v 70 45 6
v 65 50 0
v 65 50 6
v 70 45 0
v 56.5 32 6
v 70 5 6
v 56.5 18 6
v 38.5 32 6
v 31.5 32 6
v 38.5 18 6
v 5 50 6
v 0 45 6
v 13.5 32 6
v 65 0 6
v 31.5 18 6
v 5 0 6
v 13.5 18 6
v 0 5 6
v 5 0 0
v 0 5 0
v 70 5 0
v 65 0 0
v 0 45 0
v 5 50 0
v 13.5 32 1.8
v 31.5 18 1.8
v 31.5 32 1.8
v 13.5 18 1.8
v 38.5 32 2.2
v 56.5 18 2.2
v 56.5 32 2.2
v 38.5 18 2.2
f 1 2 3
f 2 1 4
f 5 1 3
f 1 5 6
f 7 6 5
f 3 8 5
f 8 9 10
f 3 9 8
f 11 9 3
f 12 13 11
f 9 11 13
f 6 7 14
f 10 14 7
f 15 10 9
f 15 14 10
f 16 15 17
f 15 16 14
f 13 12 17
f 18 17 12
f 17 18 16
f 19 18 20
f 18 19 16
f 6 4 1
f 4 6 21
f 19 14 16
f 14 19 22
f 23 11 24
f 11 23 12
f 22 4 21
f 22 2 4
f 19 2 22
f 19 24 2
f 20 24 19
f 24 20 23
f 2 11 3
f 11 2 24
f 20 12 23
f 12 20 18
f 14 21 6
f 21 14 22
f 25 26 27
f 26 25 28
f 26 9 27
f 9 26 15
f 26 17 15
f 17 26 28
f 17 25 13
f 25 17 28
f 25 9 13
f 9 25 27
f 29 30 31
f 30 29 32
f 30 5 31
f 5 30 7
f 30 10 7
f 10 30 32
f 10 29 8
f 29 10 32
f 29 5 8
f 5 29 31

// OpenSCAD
$fn = 32;

// ----------------------------------------------------------------------
// Windowed plate: 2 voids, 70 x 50 x 6 mm
// ----------------------------------------------------------------------

// --- parameters (mm) ---
plate_l = 70;             // plate length, X
plate_w = 50;             // plate width, Y
plate_t = 6;              // plate thickness, Z
edge_margin = 10;         // wall from the plate edge to any window
windows = 2;              // number of windows in the row
win_l = 18;               // window length
win_w = 14;               // window width
win_pitch = 25;           // window pitch along X
depth_1 = 4.2;            // depth of void 1 (full thickness = through)
depth_2 = 3.8;            // depth of void 2 (full thickness = through)
corner_c = 5;             // corner chamfer of the plate

profile = [[5, 0], [65, 0], [70, 5], [70, 45], [65, 50], [5, 50], [0, 45], [0, 5]];  // primary outline, 8 points, counter clockwise
void_1 = [[13.5, 18], [31.5, 18], [31.5, 32], [13.5, 32]];  // window 1 of the row, 4 points
void_2 = [[38.5, 18], [56.5, 18], [56.5, 32], [38.5, 32]];  // window 2 of the row, 4 points

// --- the one profile operation ---
difference() {
  linear_extrude(height = plate_t) polygon(points = profile);
  translate([0, 0, plate_t - depth_1])
    linear_extrude(height = depth_1 + 1) polygon(points = void_1);
  translate([0, 0, plate_t - depth_2])
    linear_extrude(height = depth_2 + 1) polygon(points = void_2);
}
